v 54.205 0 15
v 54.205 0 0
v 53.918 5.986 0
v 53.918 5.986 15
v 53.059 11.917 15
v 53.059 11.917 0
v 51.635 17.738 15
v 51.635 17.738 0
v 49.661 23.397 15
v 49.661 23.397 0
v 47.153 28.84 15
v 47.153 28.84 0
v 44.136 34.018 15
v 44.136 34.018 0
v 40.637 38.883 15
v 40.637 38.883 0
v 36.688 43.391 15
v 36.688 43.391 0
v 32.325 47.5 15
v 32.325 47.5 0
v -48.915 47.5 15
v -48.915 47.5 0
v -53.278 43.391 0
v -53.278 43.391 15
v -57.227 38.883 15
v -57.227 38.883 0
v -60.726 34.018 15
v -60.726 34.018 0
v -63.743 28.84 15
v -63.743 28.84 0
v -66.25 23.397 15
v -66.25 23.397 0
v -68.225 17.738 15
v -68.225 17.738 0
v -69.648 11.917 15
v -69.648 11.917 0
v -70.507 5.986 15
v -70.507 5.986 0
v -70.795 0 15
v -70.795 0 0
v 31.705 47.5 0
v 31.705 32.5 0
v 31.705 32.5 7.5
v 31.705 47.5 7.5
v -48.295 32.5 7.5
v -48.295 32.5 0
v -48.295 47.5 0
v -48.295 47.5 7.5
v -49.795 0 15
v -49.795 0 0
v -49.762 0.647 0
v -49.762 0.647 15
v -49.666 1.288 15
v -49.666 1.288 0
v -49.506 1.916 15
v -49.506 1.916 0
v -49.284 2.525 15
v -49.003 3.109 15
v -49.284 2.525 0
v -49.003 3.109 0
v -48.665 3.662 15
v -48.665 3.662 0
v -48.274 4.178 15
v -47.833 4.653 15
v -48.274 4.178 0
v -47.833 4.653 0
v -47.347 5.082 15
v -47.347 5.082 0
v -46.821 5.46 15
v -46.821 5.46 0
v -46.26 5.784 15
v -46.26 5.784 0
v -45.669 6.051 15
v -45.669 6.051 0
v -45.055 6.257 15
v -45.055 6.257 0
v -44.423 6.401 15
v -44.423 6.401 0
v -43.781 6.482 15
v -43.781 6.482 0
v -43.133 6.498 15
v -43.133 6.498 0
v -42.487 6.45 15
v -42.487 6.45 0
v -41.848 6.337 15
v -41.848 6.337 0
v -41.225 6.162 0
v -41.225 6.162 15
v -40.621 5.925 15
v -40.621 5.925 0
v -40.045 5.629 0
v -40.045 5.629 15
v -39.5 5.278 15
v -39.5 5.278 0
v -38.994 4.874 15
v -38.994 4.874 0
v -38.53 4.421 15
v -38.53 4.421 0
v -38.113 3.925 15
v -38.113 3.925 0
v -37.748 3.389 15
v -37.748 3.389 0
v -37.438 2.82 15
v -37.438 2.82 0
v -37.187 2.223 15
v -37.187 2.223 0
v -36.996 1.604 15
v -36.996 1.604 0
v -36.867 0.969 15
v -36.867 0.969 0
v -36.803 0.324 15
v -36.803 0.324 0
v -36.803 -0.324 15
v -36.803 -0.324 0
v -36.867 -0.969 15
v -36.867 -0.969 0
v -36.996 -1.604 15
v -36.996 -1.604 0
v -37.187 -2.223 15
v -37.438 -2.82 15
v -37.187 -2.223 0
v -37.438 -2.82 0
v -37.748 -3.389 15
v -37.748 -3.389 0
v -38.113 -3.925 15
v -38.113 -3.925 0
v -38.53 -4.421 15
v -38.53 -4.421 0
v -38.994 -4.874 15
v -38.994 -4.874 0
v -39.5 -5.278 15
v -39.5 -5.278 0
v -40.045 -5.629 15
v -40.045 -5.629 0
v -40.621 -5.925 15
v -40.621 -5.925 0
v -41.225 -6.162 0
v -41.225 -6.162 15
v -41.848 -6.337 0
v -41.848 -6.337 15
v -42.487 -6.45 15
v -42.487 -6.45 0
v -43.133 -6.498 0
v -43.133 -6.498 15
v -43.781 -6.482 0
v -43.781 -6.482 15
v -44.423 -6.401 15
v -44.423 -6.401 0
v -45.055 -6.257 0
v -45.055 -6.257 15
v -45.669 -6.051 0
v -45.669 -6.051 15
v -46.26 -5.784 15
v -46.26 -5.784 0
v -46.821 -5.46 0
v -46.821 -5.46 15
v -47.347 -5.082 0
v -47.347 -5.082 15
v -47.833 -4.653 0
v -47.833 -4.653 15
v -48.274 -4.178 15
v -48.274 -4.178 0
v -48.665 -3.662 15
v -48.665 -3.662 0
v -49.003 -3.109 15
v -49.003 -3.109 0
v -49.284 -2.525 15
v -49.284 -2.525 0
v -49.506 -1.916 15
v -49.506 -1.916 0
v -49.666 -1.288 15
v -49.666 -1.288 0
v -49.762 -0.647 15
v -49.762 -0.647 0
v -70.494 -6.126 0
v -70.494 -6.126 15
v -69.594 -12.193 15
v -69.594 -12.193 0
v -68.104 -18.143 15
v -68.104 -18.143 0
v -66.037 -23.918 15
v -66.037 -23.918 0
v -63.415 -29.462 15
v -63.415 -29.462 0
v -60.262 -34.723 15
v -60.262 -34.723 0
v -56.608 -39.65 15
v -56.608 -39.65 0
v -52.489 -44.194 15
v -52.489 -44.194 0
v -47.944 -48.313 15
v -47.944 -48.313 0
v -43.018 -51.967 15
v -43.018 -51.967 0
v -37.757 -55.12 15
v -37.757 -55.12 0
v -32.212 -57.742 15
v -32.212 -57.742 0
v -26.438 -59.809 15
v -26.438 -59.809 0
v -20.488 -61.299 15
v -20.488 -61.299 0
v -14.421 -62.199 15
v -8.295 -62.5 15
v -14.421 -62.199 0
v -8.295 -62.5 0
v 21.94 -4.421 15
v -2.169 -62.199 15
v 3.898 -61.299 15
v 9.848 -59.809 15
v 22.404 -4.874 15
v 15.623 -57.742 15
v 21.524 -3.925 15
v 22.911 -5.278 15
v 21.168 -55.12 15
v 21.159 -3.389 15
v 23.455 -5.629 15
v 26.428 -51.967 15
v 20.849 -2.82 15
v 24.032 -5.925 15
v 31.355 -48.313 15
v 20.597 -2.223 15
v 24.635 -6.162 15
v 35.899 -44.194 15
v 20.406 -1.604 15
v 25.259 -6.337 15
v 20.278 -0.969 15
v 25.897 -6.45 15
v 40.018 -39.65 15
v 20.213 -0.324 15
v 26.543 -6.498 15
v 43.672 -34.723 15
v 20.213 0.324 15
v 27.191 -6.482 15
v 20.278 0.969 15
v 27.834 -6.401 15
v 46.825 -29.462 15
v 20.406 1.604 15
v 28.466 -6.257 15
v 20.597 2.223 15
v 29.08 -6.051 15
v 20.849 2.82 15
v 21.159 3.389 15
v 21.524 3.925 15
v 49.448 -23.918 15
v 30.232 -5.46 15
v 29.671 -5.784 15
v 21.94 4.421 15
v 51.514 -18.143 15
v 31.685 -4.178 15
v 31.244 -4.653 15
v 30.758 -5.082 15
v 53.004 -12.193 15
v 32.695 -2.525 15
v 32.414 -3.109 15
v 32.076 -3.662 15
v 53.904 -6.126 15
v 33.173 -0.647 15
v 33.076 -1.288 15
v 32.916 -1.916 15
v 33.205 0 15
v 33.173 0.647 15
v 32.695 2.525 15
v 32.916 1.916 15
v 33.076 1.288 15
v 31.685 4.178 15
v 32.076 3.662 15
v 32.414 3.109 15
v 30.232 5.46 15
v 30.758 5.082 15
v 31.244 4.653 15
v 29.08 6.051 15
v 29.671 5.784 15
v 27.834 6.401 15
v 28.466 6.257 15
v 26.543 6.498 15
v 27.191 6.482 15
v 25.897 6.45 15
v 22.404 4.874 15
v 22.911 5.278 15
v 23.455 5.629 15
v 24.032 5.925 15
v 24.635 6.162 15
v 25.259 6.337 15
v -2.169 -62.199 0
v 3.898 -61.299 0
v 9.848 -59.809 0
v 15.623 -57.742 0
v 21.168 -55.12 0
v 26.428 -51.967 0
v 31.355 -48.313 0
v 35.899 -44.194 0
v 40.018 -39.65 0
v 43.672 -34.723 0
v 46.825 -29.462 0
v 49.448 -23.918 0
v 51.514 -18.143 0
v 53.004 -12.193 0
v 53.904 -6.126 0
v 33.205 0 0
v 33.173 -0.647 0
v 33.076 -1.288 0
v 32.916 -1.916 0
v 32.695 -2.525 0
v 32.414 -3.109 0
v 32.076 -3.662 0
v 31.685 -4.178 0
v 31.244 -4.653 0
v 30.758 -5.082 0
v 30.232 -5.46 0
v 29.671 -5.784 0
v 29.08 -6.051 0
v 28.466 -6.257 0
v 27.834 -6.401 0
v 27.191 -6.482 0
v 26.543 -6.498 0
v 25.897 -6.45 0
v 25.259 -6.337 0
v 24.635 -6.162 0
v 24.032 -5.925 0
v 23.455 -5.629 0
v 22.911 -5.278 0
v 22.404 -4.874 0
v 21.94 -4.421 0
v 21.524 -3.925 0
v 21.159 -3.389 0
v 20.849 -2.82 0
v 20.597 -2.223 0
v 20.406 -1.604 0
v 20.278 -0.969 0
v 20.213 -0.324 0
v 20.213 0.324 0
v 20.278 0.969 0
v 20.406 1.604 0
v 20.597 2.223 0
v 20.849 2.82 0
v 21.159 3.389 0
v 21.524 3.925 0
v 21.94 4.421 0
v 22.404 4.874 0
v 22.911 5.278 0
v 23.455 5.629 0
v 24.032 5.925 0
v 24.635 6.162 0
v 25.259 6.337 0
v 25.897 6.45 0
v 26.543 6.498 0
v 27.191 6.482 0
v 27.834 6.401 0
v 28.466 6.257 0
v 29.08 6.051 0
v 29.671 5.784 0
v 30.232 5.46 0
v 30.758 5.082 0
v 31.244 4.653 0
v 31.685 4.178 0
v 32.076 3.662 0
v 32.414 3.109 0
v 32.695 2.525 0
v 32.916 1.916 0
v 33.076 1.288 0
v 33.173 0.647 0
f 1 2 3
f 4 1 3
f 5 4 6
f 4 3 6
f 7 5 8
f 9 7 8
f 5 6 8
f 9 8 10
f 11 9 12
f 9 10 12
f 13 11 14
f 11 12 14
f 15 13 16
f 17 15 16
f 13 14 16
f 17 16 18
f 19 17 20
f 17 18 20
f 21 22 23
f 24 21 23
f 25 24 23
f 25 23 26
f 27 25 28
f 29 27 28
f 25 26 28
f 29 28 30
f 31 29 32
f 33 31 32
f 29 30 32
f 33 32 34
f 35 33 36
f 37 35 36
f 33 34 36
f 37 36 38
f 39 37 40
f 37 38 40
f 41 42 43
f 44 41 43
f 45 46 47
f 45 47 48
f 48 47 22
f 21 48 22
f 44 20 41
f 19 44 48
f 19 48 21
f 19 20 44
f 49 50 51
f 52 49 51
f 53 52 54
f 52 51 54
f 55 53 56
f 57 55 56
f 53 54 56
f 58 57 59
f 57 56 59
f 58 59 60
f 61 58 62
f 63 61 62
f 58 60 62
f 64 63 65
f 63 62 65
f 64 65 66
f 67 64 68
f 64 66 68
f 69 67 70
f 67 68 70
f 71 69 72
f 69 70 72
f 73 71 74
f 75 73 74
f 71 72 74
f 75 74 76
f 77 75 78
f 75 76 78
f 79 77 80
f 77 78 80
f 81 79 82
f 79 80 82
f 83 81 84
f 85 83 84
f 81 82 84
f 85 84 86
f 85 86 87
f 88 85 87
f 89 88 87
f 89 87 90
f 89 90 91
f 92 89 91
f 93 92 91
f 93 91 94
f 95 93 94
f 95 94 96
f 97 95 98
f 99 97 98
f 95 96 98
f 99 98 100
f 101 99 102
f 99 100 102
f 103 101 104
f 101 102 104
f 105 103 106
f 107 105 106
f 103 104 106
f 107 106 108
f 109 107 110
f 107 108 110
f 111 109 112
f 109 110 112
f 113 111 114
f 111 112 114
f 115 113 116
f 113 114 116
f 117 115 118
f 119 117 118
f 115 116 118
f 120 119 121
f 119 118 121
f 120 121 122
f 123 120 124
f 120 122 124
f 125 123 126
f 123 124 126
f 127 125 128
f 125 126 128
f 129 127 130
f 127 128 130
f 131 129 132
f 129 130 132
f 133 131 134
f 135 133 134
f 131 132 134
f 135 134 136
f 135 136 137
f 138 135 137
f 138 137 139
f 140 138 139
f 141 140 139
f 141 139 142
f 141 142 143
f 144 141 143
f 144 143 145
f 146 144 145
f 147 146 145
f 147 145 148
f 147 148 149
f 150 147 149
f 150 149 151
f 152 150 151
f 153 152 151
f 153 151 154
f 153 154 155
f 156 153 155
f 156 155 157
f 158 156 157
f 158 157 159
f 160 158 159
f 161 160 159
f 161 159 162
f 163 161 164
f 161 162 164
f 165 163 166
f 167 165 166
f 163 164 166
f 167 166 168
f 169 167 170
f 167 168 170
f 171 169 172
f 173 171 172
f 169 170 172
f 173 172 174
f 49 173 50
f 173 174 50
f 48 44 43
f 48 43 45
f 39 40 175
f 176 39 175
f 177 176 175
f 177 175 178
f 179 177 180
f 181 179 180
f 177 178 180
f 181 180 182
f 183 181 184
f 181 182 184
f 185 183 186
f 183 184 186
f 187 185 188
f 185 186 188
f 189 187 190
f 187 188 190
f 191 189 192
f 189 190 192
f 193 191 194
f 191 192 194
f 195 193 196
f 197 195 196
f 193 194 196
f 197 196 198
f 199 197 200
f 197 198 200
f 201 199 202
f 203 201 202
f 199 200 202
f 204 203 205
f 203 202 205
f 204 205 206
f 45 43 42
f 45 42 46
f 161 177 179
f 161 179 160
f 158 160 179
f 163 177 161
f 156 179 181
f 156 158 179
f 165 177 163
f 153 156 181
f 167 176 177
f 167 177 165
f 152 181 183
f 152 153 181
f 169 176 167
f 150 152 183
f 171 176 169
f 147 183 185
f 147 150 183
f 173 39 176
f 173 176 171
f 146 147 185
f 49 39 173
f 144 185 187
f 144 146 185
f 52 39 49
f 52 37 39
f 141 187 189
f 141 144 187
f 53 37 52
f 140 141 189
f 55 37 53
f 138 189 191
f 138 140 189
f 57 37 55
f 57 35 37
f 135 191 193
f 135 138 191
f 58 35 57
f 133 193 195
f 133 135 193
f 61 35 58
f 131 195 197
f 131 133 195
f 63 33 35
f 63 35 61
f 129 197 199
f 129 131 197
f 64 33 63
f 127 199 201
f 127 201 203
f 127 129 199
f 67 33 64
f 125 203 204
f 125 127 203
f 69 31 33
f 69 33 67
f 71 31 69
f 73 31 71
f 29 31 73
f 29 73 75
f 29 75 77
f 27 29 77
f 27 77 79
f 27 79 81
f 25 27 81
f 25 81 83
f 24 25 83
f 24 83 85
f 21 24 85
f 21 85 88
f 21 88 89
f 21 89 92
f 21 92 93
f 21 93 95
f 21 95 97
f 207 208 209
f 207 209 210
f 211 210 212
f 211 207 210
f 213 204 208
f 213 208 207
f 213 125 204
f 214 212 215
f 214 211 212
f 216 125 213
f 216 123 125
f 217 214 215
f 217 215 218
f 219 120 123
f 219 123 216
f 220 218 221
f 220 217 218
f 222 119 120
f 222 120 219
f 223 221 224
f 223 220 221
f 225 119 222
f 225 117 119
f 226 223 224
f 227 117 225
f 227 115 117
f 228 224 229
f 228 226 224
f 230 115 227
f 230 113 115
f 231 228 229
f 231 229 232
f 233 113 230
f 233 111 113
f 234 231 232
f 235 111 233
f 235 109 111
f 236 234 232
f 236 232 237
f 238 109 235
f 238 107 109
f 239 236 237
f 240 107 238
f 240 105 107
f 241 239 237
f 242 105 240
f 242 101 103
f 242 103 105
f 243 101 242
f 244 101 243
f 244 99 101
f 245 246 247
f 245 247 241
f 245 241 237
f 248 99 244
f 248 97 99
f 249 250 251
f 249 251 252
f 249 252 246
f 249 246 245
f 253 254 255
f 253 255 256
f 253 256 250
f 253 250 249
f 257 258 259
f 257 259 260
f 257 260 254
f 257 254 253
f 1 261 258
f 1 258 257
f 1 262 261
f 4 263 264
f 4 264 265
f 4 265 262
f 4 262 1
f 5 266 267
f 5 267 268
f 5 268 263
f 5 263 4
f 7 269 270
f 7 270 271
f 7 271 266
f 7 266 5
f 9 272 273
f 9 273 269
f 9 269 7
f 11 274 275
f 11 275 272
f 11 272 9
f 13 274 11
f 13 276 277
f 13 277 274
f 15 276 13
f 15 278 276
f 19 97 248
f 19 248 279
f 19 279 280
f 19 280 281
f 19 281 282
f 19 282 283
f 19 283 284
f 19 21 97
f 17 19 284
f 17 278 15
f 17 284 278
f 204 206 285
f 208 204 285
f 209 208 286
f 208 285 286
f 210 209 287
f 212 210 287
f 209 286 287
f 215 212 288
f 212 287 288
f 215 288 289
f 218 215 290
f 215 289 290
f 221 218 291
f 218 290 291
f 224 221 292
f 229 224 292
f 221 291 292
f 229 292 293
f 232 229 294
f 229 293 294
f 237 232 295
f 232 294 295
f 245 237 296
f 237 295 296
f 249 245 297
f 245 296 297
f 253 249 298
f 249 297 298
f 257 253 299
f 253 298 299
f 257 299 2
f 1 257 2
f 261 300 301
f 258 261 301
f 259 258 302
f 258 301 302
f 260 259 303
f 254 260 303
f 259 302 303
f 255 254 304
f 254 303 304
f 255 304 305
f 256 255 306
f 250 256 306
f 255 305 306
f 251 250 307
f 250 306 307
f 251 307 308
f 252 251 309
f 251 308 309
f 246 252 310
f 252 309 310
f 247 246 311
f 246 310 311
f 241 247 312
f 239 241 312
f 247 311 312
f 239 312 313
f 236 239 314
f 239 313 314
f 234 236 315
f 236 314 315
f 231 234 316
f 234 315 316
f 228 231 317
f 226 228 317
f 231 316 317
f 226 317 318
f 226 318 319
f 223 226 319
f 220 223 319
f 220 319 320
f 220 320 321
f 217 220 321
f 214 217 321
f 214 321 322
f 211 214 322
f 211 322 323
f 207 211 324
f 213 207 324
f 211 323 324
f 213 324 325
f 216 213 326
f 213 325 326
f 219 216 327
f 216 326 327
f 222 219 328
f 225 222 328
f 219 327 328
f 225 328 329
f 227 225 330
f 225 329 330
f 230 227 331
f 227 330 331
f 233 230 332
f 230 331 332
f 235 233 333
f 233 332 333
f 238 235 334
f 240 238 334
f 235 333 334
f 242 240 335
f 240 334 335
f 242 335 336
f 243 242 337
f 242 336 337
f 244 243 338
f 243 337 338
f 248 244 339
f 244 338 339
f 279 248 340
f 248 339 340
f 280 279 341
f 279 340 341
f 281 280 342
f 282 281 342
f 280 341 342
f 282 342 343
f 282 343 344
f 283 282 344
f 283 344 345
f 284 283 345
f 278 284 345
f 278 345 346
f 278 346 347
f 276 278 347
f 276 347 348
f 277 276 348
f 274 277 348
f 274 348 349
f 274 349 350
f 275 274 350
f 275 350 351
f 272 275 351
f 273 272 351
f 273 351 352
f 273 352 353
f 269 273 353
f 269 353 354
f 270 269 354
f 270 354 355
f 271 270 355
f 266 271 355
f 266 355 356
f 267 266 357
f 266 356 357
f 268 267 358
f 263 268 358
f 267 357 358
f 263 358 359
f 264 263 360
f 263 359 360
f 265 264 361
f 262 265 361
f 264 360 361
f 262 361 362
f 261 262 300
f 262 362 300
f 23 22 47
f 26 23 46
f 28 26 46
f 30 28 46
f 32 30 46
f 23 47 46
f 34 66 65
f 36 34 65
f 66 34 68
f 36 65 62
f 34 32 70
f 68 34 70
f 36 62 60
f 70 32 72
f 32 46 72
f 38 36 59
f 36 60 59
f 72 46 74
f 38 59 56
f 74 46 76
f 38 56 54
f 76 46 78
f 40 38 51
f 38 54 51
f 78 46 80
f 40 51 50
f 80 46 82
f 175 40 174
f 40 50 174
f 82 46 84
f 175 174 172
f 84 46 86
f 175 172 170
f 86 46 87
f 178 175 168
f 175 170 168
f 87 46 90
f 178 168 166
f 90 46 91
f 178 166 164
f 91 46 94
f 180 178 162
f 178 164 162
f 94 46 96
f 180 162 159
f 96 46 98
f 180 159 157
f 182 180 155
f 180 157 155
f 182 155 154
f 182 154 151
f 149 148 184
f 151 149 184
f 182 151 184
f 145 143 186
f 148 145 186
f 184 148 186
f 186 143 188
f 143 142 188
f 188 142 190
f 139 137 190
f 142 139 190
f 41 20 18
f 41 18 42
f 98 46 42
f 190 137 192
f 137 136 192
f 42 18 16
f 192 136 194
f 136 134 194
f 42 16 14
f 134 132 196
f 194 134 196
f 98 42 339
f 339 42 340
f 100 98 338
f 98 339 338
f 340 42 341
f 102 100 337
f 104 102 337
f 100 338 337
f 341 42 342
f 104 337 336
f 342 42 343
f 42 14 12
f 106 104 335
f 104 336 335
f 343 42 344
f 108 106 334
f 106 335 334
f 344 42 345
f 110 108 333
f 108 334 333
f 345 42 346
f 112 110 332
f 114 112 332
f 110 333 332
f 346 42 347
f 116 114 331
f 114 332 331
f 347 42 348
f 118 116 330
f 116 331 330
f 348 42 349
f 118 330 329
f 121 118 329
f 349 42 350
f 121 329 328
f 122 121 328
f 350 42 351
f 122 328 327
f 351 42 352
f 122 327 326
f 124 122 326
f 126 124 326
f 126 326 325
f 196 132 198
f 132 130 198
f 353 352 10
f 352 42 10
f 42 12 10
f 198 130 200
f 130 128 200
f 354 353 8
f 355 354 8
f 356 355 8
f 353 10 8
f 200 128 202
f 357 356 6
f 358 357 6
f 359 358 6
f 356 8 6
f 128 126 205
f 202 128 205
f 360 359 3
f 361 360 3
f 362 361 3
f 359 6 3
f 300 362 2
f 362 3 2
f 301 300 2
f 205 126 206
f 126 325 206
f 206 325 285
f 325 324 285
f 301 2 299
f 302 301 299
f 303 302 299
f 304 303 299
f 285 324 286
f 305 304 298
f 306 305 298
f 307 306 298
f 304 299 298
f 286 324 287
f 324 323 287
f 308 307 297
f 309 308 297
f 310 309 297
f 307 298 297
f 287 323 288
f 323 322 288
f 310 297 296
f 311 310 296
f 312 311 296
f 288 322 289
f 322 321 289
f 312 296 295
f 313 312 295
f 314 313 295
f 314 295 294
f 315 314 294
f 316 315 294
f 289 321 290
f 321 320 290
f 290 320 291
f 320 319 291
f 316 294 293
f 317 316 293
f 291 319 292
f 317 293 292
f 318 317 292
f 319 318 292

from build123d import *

# Parameters (mm, degrees)
F1_DEPTH = 15
F2_W     = 81.2403840464
F2_H     = 7.5
F3_DEPTH = 15
F4_DEPTH = 0.62
F5_DEPTH = 0.62


with BuildPart() as f1:
    # F0 (on Top) → F1 (new body)
    with BuildSketch(Plane.XY):
        with BuildLine():
            Line((-8.2947787642, 47.5), (-8.2947787642, 0))
            Line((-8.2947787642, 0), (20.2052212358, 0))
            ThreePointArc((20.2052212358, 0), (26.7052212358, 6.5), (33.2052212358, 0))
            Line((33.2052212358, 0), (54.2052212358, 0))
            ThreePointArc((54.2052212358, 0), (48.4723420076, 26.148498987), (32.3254132589, 47.5))
            Line((32.3254132589, 47.5), (-8.2947787642, 47.5))
        make_face()
        with BuildLine():
            Line((20.2052212358, 0), (-8.2947787642, 0))
            Line((-8.2947787642, 0), (-8.2947787642, -62.5))
            ThreePointArc((-8.2947787642, -62.5), (35.8993950599, -44.1941738242), (54.2052212358, 0))
            Line((54.2052212358, 0), (33.2052212358, 0))
            ThreePointArc((33.2052212358, 0), (26.7052212358, -6.5), (20.2052212358, 0))
        make_face()
        with BuildLine():
            Line((-8.2947787642, 0), (-36.7947787642, 0))
            ThreePointArc((-36.7947787642, 0), (-43.2947787642, -6.5), (-49.7947787642, 0))
            Line((-49.7947787642, 0), (-70.7947787642, 0))
            ThreePointArc((-70.7947787642, 0), (-52.4889525884, -44.1941738242), (-8.2947787642, -62.5))
            Line((-8.2947787642, -62.5), (-8.2947787642, 0))
        make_face()
        with BuildLine():
            ThreePointArc((-49.7947787642, 0), (-43.2947787642, 6.5), (-36.7947787642, 0))
            Line((-36.7947787642, 0), (-8.2947787642, 0))
            Line((-8.2947787642, 0), (-8.2947787642, 47.5))
            Line((-8.2947787642, 47.5), (-48.9149707874, 47.5))
            ThreePointArc((-48.9149707874, 47.5), (-65.0618995361, 26.148498987), (-70.7947787642, 0))
            Line((-70.7947787642, 0), (-49.7947787642, 0))
        make_face()
    extrude(amount=F1_DEPTH)

    # F2 (on face) → F3 (cut)
    with BuildSketch(Plane(origin=(0, 47.5, 0), x_dir=(-1, 0, 0), z_dir=(0, 1, 0))):
        with Locations((8.2947787642, 3.75)):
            Rectangle(F2_W, F2_H)
    extrude(amount=-F3_DEPTH, mode=Mode.SUBTRACT)

    # F4 (add): a face of the model
    f4_faces = [f1.faces().sort_by_distance(p)[0] for p in [
        (-48.9149707874, 40, 3.75),
    ]]
    extrude(f4_faces, amount=F4_DEPTH)

    # F5 (add): a face of the model
    f5_faces = [f1.faces().sort_by_distance(p)[0] for p in [
        (32.3254132589, 40, 3.75),
    ]]
    extrude(f5_faces, amount=F5_DEPTH)


solid = f1.part
